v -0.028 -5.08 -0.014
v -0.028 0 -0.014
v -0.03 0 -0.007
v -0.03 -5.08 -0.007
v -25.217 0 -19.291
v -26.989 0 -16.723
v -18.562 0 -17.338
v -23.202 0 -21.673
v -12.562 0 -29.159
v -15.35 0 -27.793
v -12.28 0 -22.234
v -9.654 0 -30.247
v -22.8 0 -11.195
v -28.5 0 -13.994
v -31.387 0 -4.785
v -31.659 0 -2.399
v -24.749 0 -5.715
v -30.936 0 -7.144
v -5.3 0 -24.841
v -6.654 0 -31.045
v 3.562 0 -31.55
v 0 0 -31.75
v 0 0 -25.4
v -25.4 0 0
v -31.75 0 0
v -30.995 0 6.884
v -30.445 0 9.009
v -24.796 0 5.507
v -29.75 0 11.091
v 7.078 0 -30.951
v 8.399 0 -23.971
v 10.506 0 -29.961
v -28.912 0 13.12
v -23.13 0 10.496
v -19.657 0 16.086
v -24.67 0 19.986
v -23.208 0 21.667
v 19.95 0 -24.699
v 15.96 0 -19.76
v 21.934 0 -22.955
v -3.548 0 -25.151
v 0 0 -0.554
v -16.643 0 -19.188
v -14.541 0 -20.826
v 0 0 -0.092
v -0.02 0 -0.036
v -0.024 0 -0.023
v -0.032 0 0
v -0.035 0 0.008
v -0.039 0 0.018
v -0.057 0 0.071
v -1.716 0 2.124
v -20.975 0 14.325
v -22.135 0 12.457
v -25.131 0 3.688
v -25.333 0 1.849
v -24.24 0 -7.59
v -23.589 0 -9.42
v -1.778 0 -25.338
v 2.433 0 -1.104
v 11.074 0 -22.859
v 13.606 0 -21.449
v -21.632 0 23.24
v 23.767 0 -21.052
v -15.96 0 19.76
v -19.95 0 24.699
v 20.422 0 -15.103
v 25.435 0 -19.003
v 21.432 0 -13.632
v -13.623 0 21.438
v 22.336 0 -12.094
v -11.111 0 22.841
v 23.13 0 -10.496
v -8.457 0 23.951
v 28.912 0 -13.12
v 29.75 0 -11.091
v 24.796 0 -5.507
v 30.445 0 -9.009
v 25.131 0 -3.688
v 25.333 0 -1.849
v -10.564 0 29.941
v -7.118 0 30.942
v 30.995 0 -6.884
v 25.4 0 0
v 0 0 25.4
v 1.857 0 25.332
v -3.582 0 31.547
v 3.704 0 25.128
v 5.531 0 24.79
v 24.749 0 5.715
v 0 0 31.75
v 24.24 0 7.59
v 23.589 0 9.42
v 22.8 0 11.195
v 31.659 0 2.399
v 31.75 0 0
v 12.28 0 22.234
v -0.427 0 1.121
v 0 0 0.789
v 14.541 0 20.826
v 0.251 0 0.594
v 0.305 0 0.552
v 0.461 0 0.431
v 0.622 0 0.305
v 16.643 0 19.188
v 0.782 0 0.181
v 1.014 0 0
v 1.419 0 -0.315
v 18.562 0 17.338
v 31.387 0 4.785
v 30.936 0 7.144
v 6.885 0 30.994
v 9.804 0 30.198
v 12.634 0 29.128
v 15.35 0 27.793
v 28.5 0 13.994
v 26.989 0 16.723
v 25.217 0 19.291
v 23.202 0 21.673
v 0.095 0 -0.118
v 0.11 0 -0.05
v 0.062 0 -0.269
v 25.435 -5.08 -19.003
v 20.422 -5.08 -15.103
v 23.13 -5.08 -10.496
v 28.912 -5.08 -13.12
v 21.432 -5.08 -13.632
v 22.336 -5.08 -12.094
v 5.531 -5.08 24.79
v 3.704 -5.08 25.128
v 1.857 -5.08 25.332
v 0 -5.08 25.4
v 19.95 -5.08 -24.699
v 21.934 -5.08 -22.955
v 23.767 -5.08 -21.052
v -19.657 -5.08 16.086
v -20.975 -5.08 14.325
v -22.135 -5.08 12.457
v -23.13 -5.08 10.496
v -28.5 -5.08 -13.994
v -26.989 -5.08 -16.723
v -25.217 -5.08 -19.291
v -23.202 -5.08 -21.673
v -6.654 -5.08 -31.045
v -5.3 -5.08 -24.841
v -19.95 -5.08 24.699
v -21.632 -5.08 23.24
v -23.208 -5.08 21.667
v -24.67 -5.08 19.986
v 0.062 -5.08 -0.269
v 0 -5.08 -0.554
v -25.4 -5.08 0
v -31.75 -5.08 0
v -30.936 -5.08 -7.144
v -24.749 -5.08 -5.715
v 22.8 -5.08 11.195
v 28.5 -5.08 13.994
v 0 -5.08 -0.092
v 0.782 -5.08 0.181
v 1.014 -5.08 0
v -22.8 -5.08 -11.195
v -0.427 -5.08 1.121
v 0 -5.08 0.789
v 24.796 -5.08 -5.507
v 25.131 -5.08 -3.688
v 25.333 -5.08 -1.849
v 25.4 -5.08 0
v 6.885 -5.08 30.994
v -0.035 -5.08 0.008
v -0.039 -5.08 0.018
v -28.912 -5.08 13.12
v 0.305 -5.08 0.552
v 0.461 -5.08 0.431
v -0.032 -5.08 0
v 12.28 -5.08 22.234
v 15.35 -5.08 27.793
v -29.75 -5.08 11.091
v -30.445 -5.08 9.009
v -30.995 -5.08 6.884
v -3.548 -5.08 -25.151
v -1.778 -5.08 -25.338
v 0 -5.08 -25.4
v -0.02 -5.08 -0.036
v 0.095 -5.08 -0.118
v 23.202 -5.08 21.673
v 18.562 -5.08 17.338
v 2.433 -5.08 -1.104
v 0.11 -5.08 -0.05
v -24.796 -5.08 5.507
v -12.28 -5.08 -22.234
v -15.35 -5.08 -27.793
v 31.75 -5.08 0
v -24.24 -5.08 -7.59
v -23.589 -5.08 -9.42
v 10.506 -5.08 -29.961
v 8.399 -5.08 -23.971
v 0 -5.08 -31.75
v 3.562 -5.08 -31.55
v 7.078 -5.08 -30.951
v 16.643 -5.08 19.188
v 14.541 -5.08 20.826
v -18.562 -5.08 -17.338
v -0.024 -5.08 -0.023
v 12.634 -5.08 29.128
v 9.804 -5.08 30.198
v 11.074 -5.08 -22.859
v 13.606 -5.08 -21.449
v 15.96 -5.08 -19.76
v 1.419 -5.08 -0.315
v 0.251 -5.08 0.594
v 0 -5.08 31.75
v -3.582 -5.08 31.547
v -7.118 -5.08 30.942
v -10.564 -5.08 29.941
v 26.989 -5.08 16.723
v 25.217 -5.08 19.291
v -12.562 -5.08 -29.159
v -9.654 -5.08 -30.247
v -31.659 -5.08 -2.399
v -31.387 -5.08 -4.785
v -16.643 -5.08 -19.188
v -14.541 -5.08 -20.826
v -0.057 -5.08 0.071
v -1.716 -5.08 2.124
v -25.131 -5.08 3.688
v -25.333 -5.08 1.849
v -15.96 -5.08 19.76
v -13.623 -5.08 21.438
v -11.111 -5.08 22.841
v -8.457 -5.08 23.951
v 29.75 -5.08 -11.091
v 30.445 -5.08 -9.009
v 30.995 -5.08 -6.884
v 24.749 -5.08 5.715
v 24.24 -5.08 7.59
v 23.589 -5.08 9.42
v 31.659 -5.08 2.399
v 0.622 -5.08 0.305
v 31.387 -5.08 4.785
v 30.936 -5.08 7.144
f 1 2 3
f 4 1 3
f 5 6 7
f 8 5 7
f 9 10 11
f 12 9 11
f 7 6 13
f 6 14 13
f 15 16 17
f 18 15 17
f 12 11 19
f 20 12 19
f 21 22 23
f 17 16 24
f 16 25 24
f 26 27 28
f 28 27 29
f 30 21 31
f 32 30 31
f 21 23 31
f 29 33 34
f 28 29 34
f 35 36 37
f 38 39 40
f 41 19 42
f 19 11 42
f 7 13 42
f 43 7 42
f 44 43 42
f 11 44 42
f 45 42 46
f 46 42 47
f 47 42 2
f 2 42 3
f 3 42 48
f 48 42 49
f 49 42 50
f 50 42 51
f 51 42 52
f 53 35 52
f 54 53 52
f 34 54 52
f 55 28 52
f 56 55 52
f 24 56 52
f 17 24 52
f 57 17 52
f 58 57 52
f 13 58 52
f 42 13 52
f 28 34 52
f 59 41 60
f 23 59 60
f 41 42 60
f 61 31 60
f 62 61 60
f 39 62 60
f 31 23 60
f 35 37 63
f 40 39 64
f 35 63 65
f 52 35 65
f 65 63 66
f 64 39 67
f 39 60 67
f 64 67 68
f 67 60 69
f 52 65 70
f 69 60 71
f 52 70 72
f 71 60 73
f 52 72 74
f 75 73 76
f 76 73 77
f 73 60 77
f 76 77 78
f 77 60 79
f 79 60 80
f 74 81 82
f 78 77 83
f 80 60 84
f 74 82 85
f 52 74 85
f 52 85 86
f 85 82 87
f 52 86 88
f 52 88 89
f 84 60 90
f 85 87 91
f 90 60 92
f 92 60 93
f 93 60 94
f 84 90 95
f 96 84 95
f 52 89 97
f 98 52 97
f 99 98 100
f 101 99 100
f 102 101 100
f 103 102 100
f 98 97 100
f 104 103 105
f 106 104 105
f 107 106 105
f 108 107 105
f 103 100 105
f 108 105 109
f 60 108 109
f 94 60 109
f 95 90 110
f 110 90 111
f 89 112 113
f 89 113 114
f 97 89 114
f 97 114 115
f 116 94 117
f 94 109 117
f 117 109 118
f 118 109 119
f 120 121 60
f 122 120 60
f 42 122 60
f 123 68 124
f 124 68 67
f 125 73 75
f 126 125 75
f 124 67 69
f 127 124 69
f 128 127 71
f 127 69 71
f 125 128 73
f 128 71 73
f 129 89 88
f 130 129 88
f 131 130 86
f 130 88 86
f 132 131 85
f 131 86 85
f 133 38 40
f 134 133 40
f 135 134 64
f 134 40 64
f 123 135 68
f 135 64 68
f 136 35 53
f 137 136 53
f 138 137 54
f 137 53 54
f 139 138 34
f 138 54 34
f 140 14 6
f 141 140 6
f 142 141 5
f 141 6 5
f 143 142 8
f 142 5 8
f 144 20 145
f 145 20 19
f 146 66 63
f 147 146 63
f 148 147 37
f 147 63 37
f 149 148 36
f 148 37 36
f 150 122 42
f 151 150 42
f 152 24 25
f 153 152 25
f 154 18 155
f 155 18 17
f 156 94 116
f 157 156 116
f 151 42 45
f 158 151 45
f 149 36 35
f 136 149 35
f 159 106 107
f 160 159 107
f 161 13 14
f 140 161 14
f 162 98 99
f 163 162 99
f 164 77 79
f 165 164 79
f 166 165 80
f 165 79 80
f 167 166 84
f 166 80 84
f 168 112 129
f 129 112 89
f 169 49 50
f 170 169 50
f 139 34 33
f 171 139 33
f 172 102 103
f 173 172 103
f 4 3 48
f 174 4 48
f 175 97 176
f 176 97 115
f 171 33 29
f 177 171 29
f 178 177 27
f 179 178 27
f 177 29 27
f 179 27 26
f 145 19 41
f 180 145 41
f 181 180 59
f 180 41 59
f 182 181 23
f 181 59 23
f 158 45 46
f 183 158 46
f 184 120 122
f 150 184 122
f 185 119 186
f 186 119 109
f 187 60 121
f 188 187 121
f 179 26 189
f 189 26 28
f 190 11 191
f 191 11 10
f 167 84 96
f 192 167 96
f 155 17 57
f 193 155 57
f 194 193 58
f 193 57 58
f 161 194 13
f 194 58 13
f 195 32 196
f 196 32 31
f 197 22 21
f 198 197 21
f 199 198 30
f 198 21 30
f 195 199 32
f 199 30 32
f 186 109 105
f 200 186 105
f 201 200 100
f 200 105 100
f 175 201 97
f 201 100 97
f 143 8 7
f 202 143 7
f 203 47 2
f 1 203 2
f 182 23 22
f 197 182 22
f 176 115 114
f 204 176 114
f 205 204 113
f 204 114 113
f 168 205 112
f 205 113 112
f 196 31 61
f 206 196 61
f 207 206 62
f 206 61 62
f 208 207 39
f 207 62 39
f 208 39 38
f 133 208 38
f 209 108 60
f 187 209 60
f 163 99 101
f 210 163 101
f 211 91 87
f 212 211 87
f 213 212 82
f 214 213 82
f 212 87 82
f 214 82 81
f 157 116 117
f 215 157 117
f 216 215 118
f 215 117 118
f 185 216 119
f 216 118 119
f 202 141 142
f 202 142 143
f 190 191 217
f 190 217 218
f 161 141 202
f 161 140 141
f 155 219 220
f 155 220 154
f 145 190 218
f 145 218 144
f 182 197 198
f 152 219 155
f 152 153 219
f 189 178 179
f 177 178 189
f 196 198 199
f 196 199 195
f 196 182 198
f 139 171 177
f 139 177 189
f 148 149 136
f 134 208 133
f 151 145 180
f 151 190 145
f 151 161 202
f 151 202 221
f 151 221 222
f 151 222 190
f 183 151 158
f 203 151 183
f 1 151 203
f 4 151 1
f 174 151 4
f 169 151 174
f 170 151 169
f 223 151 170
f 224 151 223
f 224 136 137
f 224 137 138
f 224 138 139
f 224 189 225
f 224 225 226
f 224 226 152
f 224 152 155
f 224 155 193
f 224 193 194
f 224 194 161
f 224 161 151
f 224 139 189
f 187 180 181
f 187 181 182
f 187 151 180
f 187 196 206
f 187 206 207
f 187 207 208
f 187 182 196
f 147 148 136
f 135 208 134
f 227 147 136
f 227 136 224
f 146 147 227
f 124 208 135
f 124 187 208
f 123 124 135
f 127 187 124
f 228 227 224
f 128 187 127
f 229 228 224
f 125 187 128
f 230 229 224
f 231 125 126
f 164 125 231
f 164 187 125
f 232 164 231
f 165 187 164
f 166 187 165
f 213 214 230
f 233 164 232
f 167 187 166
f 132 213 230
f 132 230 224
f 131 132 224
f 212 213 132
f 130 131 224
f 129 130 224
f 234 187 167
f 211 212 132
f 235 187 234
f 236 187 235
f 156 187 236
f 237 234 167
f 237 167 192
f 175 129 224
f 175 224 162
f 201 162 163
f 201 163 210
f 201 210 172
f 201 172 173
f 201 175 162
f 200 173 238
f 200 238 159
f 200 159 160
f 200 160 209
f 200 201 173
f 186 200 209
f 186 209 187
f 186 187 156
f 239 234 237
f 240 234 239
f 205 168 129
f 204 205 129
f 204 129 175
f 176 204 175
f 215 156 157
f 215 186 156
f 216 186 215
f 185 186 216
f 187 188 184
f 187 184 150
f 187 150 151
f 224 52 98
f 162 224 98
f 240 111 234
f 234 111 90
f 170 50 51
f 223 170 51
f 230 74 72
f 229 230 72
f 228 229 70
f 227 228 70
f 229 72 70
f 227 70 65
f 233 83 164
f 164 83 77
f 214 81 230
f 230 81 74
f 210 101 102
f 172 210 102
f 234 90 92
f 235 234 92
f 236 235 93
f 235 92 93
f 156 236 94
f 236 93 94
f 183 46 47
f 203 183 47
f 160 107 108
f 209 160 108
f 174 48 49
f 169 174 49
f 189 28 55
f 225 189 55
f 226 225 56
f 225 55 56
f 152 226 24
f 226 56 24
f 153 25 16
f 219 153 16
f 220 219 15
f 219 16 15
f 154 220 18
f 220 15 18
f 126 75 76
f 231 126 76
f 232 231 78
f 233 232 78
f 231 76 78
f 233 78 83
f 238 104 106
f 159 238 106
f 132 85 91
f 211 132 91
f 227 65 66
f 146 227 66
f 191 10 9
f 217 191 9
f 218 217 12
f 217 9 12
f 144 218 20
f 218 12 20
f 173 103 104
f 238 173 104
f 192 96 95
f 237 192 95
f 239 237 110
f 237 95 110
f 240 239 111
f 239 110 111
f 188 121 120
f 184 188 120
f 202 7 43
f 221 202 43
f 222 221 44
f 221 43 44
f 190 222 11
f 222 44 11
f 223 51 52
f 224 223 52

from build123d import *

# Parameters (mm, degrees)
F1_DEPTH = 5.08


with BuildPart() as f1:
    # F0 (on Front) → F1 (new body)
    with BuildSketch(Plane.XZ):
        with BuildLine():
            Line((25.4, 0), (31.75, 0))
            ThreePointArc((31.75, 0), (31.5458283638, 3.5948870413), (30.9359393487, 7.1435395019))
            Line((30.9359393487, 7.1435395019), (24.7487514789, 5.7148316015))
            ThreePointArc((24.7487514789, 5.7148316015), (25.2366626911, 2.875909633), (25.4, 0))
        make_face()
        with BuildLine():
            ThreePointArc((28.9122550087, -13.1203662416), (30.1153661217, -10.0562032277), (30.9947400528, -6.8839370321))
            Line((30.9947400528, -6.8839370321), (24.7957920422, -5.5071496257))
            ThreePointArc((24.7957920422, -5.5071496257), (24.0922928974, -8.0449625821), (23.1298040069, -10.4962929933))
            Line((23.1298040069, -10.4962929933), (28.9122550087, -13.1203662416))
        make_face()
        with BuildLine():
            ThreePointArc((24.7957920422, -5.5071496257), (25.2484961718, -2.7700976633), (25.4, 0))
            Line((25.4, 0), (1.0141198158, 0))
            Line((1.0141198158, 0), (1.4191734003, -0.3151986533))
            Line((1.4191734003, -0.3151986533), (24.7957920422, -5.5071496257))
        make_face()
        with BuildLine():
            Line((1.0141198158, 0), (25.4, 0))
            ThreePointArc((25.4, 0), (25.2366626911, 2.875909633), (24.7487514789, 5.7148316015))
            Line((24.7487514789, 5.7148316015), (0.7820524179, 0.1805868016))
            Line((0.7820524179, 0.1805868016), (1.0141198158, 0))
        make_face()
        with BuildLine():
            Line((22.7997991551, 11.1950506245), (28.4997489439, 13.9938132806))
            ThreePointArc((28.4997489439, 13.9938132806), (26.1346358015, 18.0289575828), (23.2023701208, 21.6728521606))
            Line((23.2023701208, 21.6728521606), (18.5618960967, 17.3382817285))
            ThreePointArc((18.5618960967, 17.3382817285), (20.9077086412, 14.4231660663), (22.7997991551, 11.1950506245))
        make_face()
        with BuildLine():
            Line((0.7820524179, 0.1805868016), (24.7487514789, 5.7148316015))
            ThreePointArc((24.7487514789, 5.7148316015), (23.9316603474, 8.5109125841), (22.7997991551, 11.1950506245))
            Line((22.7997991551, 11.1950506245), (0.6217813672, 0.3053041755))
            Line((0.6217813672, 0.3053041755), (0.7820524179, 0.1805868016))
        make_face()
        with BuildLine():
            ThreePointArc((23.1298040069, -10.4962929933), (24.0922928974, -8.0449625821), (24.7957920422, -5.5071496257))
            Line((24.7957920422, -5.5071496257), (1.4191734003, -0.3151986533))
            Line((1.4191734003, -0.3151986533), (2.4329098989, -1.104053243))
            Line((2.4329098989, -1.104053243), (23.1298040069, -10.4962929933))
        make_face()
        with BuildLine():
            Line((0.6217813672, 0.3053041755), (22.7997991551, 11.1950506245))
            ThreePointArc((22.7997991551, 11.1950506245), (20.9077086412, 14.4231660663), (18.5618960967, 17.3382817285))
            Line((18.5618960967, 17.3382817285), (0.4608879437, 0.4305058584))
            Line((0.4608879437, 0.4305058584), (0.6217813672, 0.3053041755))
        make_face()
        with BuildLine():
            ThreePointArc((19.9499819818, -24.6994072586), (22.8704554558, -22.02282378), (25.4348874095, -19.0033944986))
            Line((25.4348874095, -19.0033944986), (20.4222365417, -15.1027234178))
            ThreePointArc((20.4222365417, -15.1027234178), (18.3395194553, -17.5733328128), (15.9599855854, -19.7595258069))
            Line((15.9599855854, -19.7595258069), (19.9499819818, -24.6994072586))
        make_face()
        with BuildLine():
            ThreePointArc((20.4222365417, -15.1027234178), (21.8974852278, -12.8709028704), (23.1298040069, -10.4962929933))
            Line((23.1298040069, -10.4962929933), (2.4329098989, -1.104053243))
            Line((2.4329098989, -1.104053243), (20.4222365417, -15.1027234178))
        make_face()
        with BuildLine():
            Line((12.2796028487, 22.2344632019), (15.3495035609, 27.7930790024))
            ThreePointArc((15.3495035609, 27.7930790024), (11.2320077334, 29.6968769785), (6.8852258142, 30.9944537859))
            Line((6.8852258142, 30.9944537859), (5.5312442607, 24.7904283329))
            ThreePointArc((5.5312442607, 24.7904283329), (8.9966553856, 23.7533195969), (12.2796028487, 22.2344632019))
        make_face()
        with BuildLine():
            Line((0.4608879437, 0.4305058584), (18.5618960967, 17.3382817285))
            ThreePointArc((18.5618960967, 17.3382817285), (15.6138612314, 20.0341542733), (12.2796028487, 22.2344632019))
            Line((12.2796028487, 22.2344632019), (0.3048278221, 0.5519464332))
            Line((0.3048278221, 0.5519464332), (0.4608879437, 0.4305058584))
        make_face()
        with BuildLine():
            ThreePointArc((15.9599855854, -19.7595258069), (18.3395194553, -17.5733328128), (20.4222365417, -15.1027234178))
            Line((20.4222365417, -15.1027234178), (2.4329098989, -1.104053243))
            Line((2.4329098989, -1.104053243), (0.1100244544, -0.04992904))
            Line((0.1100244544, -0.04992904), (0.0951985642, -0.1178621669))
            Line((0.0951985642, -0.1178621669), (15.9599855854, -19.7595258069))
        make_face()
        with BuildLine():
            Line((0.3048278221, 0.5519464332), (12.2796028487, 22.2344632019))
            ThreePointArc((12.2796028487, 22.2344632019), (8.9966553856, 23.7533195969), (5.5312442607, 24.7904283329))
            Line((5.5312442607, 24.7904283329), (0.2505903033, 0.5941521896))
            Line((0.2505903033, 0.5941521896), (0.3048278221, 0.5519464332))
        make_face()
        with BuildLine():
            Line((0, -30.624730456), (10.5058264675, -29.9614771037))
            Line((10.5058264675, -29.9614771037), (8.3988855156, -23.9712061043))
            ThreePointArc((8.3988855156, -23.9712061043), (4.2597749325, -25.0402539429), (0, -25.4))
            Line((0, -25.4), (0, -30.624730456))
        make_face()
        with BuildLine():
            ThreePointArc((0, -31.75), (5.3284895589, -31.2996757015), (10.5058264675, -29.9614771037))
            Line((10.5058264675, -29.9614771037), (0, -30.624730456))
            Line((0, -30.624730456), (0, -31.75))
        make_face()
        with BuildLine():
            ThreePointArc((8.3988855156, -23.9712061043), (12.3601461586, -22.1897901508), (15.9599855854, -19.7595258069))
            Line((15.9599855854, -19.7595258069), (0.0951985642, -0.1178621669))
            Line((0.0951985642, -0.1178621669), (0.0621994091, -0.2690662935))
            Line((0.0621994091, -0.2690662935), (8.3988855156, -23.9712061043))
        make_face()
        with BuildLine():
            Line((-0.0300018042, -0.0069278347), (-0.0324385118, 0))
            Line((-0.0324385118, 0), (-25.4, 0))
            ThreePointArc((-25.4, 0), (-25.2366626911, -2.875909633), (-24.7487514789, -5.7148316015))
            Line((-24.7487514789, -5.7148316015), (-0.0300018042, -0.0069278347))
        make_face()
        with BuildLine():
            Line((-25.4, 0), (-0.0324385118, 0))
            Line((-0.0324385118, 0), (-0.0351872962, 0.0078151045))
            Line((-0.0351872962, 0.0078151045), (-24.7957920422, 5.5071496257))
            ThreePointArc((-24.7957920422, 5.5071496257), (-25.2484961718, 2.7700976633), (-25.4, 0))
        make_face()
        with BuildLine():
            Line((-0.03859952, 0.0175164421), (-0.0574602451, 0.0711396129))
            Line((-0.0574602451, 0.0711396129), (-1.7159178196, 2.1244206179))
            Line((-1.7159178196, 2.1244206179), (-19.6572715888, 16.085759966))
            ThreePointArc((-19.6572715888, 16.085759966), (-21.5753098418, 13.4039548354), (-23.1298040069, 10.4962929933))
            Line((-23.1298040069, 10.4962929933), (-0.03859952, 0.0175164421))
        make_face()
        with BuildLine():
            Line((0, -0.0922263513), (-0.0198174482, -0.0358831086))
            Line((-0.0198174482, -0.0358831086), (-12.2796028487, -22.2344632019))
            ThreePointArc((-12.2796028487, -22.2344632019), (-8.8860767808, -23.794907847), (-5.3003972682, -24.8408089401))
            Line((-5.3003972682, -24.8408089401), (0, -0.5540677516))
            Line((0, -0.5540677516), (0, -0.0922263513))
        make_face()
        with BuildLine():
            Line((-12.2796028487, -22.2344632019), (-0.0198174482, -0.0358831086))
            Line((-0.0198174482, -0.0358831086), (-0.0244166428, -0.0228070791))
            Line((-0.0244166428, -0.0228070791), (-18.5618960967, -17.3382817285))
            ThreePointArc((-18.5618960967, -17.3382817285), (-15.6138612314, -20.0341542733), (-12.2796028487, -22.2344632019))
        make_face()
        with BuildLine():
            Line((-0.0351872962, 0.0078151045), (-0.03859952, 0.0175164421))
            Line((-0.03859952, 0.0175164421), (-23.1298040069, 10.4962929933))
            ThreePointArc((-23.1298040069, 10.4962929933), (-24.0922928974, 8.0449625821), (-24.7957920422, 5.5071496257))
            Line((-24.7957920422, 5.5071496257), (-0.0351872962, 0.0078151045))
        make_face()
        with BuildLine():
            Line((-0.0244166428, -0.0228070791), (-0.0276613091, -0.0135821265))
            Line((-0.0276613091, -0.0135821265), (-22.7997991551, -11.1950506245))
            ThreePointArc((-22.7997991551, -11.1950506245), (-20.9077086412, -14.4231660663), (-18.5618960967, -17.3382817285))
            Line((-18.5618960967, -17.3382817285), (-0.0244166428, -0.0228070791))
        make_face()
        with BuildLine():
            Line((-22.7997991551, -11.1950506245), (-0.0276613091, -0.0135821265))
            Line((-0.0276613091, -0.0135821265), (-0.0300018042, -0.0069278347))
            Line((-0.0300018042, -0.0069278347), (-24.7487514789, -5.7148316015))
            ThreePointArc((-24.7487514789, -5.7148316015), (-23.9316603474, -8.5109125841), (-22.7997991551, -11.1950506245))
        make_face()
        with BuildLine():
            Line((-0.4268288624, 1.1212962933), (0, 0.7891528738))
            Line((0, 0.7891528738), (0, 25.4))
            ThreePointArc((0, 25.4), (-4.2899392789, 25.0351037742), (-8.4566200813, 23.95089929))
            Line((-8.4566200813, 23.95089929), (-0.4268288624, 1.1212962933))
        make_face()
        with BuildLine():
            Line((0, 25.4), (0, 0.7891528738))
            Line((0, 0.7891528738), (0.2505903033, 0.5941521896))
            Line((0.2505903033, 0.5941521896), (5.5312442607, 24.7904283329))
            ThreePointArc((5.5312442607, 24.7904283329), (2.7823659307, 25.2471471622), (0, 25.4))
        make_face()
        with BuildLine():
            Line((0, 25.4), (0, 31.75))
            ThreePointArc((0, 31.75), (-5.3586539033, 31.2945255331), (-10.5635610332, 29.9411702894))
            Line((-10.5635610332, 29.9411702894), (-8.4566200813, 23.95089929))
            ThreePointArc((-8.4566200813, 23.95089929), (-4.2899392789, 25.0351037742), (0, 25.4))
        make_face()
        with BuildLine():
            ThreePointArc((0, -25.4), (4.2597749325, -25.0402539429), (8.3988855156, -23.9712061043))
            Line((8.3988855156, -23.9712061043), (0.0621994091, -0.2690662935))
            Line((0.0621994091, -0.2690662935), (0, -0.5540677516))
            Line((0, -0.5540677516), (0, -25.4))
        make_face()
        with BuildLine():
            ThreePointArc((-24.7487514789, -5.7148316015), (-25.2366626911, -2.875909633), (-25.4, 0))
            Line((-25.4, 0), (-31.75, 0))
            ThreePointArc((-31.75, 0), (-31.5458283638, -3.5948870413), (-30.9359393487, -7.1435395019))
            Line((-30.9359393487, -7.1435395019), (-24.7487514789, -5.7148316015))
        make_face()
        with BuildLine():
            Line((-19.6572715888, 16.085759966), (-1.7159178196, 2.1244206179))
            Line((-1.7159178196, 2.1244206179), (-15.9599855854, 19.7595258069))
            ThreePointArc((-15.9599855854, 19.7595258069), (-17.9031112106, 18.017730406), (-19.6572715888, 16.085759966))
        make_face()
        with BuildLine():
            Line((-15.9599855854, 19.7595258069), (-1.7159178196, 2.1244206179))
            Line((-1.7159178196, 2.1244206179), (-0.4268288624, 1.1212962933))
            Line((-0.4268288624, 1.1212962933), (-8.4566200813, 23.95089929))
            ThreePointArc((-8.4566200813, 23.95089929), (-12.3868705083, 22.1748830664), (-15.9599855854, 19.7595258069))
        make_face()
        with BuildLine():
            ThreePointArc((-5.3003972682, -24.8408089401), (-8.8860767808, -23.794907847), (-12.2796028487, -22.2344632019))
            Line((-12.2796028487, -22.2344632019), (-15.3495035609, -27.7930790024))
            ThreePointArc((-15.3495035609, -27.7930790024), (-11.1214292363, -29.7384651881), (-6.6543788217, -31.0448343931))
            Line((-6.6543788217, -31.0448343931), (-5.3003972682, -24.8408089401))
        make_face()
        with BuildLine():
            ThreePointArc((-24.7957920422, 5.5071496257), (-24.0922928974, 8.0449625821), (-23.1298040069, 10.4962929933))
            Line((-23.1298040069, 10.4962929933), (-28.9122550087, 13.1203662416))
            ThreePointArc((-28.9122550087, 13.1203662416), (-30.1153661217, 10.0562032277), (-30.9947400528, 6.8839370321))
            Line((-30.9947400528, 6.8839370321), (-24.7957920422, 5.5071496257))
        make_face()
        with BuildLine():
            ThreePointArc((-18.5618960967, -17.3382817285), (-20.9077086412, -14.4231660663), (-22.7997991551, -11.1950506245))
            Line((-22.7997991551, -11.1950506245), (-28.4997489439, -13.9938132806))
            ThreePointArc((-28.4997489439, -13.9938132806), (-26.1346358015, -18.0289575828), (-23.2023701208, -21.6728521606))
            Line((-23.2023701208, -21.6728521606), (-18.5618960967, -17.3382817285))
        make_face()
        with BuildLine():
            Line((0, -25.4), (0, -0.5540677516))
            Line((0, -0.5540677516), (-5.3003972682, -24.8408089401))
            ThreePointArc((-5.3003972682, -24.8408089401), (-2.6649064638, -25.25981539), (0, -25.4))
        make_face()
        with BuildLine():
            ThreePointArc((-19.6572715888, 16.085759966), (-17.9031112106, 18.017730406), (-15.9599855854, 19.7595258069))
            Line((-15.9599855854, 19.7595258069), (-19.9499819818, 24.6994072586))
            ThreePointArc((-19.9499819818, 24.6994072586), (-22.4340590223, 22.4672093457), (-24.6699224566, 19.9864310467))
            Line((-24.6699224566, 19.9864310467), (-19.6572715888, 16.085759966))
        make_face()
    extrude(amount=F1_DEPTH)


solid = f1.part
